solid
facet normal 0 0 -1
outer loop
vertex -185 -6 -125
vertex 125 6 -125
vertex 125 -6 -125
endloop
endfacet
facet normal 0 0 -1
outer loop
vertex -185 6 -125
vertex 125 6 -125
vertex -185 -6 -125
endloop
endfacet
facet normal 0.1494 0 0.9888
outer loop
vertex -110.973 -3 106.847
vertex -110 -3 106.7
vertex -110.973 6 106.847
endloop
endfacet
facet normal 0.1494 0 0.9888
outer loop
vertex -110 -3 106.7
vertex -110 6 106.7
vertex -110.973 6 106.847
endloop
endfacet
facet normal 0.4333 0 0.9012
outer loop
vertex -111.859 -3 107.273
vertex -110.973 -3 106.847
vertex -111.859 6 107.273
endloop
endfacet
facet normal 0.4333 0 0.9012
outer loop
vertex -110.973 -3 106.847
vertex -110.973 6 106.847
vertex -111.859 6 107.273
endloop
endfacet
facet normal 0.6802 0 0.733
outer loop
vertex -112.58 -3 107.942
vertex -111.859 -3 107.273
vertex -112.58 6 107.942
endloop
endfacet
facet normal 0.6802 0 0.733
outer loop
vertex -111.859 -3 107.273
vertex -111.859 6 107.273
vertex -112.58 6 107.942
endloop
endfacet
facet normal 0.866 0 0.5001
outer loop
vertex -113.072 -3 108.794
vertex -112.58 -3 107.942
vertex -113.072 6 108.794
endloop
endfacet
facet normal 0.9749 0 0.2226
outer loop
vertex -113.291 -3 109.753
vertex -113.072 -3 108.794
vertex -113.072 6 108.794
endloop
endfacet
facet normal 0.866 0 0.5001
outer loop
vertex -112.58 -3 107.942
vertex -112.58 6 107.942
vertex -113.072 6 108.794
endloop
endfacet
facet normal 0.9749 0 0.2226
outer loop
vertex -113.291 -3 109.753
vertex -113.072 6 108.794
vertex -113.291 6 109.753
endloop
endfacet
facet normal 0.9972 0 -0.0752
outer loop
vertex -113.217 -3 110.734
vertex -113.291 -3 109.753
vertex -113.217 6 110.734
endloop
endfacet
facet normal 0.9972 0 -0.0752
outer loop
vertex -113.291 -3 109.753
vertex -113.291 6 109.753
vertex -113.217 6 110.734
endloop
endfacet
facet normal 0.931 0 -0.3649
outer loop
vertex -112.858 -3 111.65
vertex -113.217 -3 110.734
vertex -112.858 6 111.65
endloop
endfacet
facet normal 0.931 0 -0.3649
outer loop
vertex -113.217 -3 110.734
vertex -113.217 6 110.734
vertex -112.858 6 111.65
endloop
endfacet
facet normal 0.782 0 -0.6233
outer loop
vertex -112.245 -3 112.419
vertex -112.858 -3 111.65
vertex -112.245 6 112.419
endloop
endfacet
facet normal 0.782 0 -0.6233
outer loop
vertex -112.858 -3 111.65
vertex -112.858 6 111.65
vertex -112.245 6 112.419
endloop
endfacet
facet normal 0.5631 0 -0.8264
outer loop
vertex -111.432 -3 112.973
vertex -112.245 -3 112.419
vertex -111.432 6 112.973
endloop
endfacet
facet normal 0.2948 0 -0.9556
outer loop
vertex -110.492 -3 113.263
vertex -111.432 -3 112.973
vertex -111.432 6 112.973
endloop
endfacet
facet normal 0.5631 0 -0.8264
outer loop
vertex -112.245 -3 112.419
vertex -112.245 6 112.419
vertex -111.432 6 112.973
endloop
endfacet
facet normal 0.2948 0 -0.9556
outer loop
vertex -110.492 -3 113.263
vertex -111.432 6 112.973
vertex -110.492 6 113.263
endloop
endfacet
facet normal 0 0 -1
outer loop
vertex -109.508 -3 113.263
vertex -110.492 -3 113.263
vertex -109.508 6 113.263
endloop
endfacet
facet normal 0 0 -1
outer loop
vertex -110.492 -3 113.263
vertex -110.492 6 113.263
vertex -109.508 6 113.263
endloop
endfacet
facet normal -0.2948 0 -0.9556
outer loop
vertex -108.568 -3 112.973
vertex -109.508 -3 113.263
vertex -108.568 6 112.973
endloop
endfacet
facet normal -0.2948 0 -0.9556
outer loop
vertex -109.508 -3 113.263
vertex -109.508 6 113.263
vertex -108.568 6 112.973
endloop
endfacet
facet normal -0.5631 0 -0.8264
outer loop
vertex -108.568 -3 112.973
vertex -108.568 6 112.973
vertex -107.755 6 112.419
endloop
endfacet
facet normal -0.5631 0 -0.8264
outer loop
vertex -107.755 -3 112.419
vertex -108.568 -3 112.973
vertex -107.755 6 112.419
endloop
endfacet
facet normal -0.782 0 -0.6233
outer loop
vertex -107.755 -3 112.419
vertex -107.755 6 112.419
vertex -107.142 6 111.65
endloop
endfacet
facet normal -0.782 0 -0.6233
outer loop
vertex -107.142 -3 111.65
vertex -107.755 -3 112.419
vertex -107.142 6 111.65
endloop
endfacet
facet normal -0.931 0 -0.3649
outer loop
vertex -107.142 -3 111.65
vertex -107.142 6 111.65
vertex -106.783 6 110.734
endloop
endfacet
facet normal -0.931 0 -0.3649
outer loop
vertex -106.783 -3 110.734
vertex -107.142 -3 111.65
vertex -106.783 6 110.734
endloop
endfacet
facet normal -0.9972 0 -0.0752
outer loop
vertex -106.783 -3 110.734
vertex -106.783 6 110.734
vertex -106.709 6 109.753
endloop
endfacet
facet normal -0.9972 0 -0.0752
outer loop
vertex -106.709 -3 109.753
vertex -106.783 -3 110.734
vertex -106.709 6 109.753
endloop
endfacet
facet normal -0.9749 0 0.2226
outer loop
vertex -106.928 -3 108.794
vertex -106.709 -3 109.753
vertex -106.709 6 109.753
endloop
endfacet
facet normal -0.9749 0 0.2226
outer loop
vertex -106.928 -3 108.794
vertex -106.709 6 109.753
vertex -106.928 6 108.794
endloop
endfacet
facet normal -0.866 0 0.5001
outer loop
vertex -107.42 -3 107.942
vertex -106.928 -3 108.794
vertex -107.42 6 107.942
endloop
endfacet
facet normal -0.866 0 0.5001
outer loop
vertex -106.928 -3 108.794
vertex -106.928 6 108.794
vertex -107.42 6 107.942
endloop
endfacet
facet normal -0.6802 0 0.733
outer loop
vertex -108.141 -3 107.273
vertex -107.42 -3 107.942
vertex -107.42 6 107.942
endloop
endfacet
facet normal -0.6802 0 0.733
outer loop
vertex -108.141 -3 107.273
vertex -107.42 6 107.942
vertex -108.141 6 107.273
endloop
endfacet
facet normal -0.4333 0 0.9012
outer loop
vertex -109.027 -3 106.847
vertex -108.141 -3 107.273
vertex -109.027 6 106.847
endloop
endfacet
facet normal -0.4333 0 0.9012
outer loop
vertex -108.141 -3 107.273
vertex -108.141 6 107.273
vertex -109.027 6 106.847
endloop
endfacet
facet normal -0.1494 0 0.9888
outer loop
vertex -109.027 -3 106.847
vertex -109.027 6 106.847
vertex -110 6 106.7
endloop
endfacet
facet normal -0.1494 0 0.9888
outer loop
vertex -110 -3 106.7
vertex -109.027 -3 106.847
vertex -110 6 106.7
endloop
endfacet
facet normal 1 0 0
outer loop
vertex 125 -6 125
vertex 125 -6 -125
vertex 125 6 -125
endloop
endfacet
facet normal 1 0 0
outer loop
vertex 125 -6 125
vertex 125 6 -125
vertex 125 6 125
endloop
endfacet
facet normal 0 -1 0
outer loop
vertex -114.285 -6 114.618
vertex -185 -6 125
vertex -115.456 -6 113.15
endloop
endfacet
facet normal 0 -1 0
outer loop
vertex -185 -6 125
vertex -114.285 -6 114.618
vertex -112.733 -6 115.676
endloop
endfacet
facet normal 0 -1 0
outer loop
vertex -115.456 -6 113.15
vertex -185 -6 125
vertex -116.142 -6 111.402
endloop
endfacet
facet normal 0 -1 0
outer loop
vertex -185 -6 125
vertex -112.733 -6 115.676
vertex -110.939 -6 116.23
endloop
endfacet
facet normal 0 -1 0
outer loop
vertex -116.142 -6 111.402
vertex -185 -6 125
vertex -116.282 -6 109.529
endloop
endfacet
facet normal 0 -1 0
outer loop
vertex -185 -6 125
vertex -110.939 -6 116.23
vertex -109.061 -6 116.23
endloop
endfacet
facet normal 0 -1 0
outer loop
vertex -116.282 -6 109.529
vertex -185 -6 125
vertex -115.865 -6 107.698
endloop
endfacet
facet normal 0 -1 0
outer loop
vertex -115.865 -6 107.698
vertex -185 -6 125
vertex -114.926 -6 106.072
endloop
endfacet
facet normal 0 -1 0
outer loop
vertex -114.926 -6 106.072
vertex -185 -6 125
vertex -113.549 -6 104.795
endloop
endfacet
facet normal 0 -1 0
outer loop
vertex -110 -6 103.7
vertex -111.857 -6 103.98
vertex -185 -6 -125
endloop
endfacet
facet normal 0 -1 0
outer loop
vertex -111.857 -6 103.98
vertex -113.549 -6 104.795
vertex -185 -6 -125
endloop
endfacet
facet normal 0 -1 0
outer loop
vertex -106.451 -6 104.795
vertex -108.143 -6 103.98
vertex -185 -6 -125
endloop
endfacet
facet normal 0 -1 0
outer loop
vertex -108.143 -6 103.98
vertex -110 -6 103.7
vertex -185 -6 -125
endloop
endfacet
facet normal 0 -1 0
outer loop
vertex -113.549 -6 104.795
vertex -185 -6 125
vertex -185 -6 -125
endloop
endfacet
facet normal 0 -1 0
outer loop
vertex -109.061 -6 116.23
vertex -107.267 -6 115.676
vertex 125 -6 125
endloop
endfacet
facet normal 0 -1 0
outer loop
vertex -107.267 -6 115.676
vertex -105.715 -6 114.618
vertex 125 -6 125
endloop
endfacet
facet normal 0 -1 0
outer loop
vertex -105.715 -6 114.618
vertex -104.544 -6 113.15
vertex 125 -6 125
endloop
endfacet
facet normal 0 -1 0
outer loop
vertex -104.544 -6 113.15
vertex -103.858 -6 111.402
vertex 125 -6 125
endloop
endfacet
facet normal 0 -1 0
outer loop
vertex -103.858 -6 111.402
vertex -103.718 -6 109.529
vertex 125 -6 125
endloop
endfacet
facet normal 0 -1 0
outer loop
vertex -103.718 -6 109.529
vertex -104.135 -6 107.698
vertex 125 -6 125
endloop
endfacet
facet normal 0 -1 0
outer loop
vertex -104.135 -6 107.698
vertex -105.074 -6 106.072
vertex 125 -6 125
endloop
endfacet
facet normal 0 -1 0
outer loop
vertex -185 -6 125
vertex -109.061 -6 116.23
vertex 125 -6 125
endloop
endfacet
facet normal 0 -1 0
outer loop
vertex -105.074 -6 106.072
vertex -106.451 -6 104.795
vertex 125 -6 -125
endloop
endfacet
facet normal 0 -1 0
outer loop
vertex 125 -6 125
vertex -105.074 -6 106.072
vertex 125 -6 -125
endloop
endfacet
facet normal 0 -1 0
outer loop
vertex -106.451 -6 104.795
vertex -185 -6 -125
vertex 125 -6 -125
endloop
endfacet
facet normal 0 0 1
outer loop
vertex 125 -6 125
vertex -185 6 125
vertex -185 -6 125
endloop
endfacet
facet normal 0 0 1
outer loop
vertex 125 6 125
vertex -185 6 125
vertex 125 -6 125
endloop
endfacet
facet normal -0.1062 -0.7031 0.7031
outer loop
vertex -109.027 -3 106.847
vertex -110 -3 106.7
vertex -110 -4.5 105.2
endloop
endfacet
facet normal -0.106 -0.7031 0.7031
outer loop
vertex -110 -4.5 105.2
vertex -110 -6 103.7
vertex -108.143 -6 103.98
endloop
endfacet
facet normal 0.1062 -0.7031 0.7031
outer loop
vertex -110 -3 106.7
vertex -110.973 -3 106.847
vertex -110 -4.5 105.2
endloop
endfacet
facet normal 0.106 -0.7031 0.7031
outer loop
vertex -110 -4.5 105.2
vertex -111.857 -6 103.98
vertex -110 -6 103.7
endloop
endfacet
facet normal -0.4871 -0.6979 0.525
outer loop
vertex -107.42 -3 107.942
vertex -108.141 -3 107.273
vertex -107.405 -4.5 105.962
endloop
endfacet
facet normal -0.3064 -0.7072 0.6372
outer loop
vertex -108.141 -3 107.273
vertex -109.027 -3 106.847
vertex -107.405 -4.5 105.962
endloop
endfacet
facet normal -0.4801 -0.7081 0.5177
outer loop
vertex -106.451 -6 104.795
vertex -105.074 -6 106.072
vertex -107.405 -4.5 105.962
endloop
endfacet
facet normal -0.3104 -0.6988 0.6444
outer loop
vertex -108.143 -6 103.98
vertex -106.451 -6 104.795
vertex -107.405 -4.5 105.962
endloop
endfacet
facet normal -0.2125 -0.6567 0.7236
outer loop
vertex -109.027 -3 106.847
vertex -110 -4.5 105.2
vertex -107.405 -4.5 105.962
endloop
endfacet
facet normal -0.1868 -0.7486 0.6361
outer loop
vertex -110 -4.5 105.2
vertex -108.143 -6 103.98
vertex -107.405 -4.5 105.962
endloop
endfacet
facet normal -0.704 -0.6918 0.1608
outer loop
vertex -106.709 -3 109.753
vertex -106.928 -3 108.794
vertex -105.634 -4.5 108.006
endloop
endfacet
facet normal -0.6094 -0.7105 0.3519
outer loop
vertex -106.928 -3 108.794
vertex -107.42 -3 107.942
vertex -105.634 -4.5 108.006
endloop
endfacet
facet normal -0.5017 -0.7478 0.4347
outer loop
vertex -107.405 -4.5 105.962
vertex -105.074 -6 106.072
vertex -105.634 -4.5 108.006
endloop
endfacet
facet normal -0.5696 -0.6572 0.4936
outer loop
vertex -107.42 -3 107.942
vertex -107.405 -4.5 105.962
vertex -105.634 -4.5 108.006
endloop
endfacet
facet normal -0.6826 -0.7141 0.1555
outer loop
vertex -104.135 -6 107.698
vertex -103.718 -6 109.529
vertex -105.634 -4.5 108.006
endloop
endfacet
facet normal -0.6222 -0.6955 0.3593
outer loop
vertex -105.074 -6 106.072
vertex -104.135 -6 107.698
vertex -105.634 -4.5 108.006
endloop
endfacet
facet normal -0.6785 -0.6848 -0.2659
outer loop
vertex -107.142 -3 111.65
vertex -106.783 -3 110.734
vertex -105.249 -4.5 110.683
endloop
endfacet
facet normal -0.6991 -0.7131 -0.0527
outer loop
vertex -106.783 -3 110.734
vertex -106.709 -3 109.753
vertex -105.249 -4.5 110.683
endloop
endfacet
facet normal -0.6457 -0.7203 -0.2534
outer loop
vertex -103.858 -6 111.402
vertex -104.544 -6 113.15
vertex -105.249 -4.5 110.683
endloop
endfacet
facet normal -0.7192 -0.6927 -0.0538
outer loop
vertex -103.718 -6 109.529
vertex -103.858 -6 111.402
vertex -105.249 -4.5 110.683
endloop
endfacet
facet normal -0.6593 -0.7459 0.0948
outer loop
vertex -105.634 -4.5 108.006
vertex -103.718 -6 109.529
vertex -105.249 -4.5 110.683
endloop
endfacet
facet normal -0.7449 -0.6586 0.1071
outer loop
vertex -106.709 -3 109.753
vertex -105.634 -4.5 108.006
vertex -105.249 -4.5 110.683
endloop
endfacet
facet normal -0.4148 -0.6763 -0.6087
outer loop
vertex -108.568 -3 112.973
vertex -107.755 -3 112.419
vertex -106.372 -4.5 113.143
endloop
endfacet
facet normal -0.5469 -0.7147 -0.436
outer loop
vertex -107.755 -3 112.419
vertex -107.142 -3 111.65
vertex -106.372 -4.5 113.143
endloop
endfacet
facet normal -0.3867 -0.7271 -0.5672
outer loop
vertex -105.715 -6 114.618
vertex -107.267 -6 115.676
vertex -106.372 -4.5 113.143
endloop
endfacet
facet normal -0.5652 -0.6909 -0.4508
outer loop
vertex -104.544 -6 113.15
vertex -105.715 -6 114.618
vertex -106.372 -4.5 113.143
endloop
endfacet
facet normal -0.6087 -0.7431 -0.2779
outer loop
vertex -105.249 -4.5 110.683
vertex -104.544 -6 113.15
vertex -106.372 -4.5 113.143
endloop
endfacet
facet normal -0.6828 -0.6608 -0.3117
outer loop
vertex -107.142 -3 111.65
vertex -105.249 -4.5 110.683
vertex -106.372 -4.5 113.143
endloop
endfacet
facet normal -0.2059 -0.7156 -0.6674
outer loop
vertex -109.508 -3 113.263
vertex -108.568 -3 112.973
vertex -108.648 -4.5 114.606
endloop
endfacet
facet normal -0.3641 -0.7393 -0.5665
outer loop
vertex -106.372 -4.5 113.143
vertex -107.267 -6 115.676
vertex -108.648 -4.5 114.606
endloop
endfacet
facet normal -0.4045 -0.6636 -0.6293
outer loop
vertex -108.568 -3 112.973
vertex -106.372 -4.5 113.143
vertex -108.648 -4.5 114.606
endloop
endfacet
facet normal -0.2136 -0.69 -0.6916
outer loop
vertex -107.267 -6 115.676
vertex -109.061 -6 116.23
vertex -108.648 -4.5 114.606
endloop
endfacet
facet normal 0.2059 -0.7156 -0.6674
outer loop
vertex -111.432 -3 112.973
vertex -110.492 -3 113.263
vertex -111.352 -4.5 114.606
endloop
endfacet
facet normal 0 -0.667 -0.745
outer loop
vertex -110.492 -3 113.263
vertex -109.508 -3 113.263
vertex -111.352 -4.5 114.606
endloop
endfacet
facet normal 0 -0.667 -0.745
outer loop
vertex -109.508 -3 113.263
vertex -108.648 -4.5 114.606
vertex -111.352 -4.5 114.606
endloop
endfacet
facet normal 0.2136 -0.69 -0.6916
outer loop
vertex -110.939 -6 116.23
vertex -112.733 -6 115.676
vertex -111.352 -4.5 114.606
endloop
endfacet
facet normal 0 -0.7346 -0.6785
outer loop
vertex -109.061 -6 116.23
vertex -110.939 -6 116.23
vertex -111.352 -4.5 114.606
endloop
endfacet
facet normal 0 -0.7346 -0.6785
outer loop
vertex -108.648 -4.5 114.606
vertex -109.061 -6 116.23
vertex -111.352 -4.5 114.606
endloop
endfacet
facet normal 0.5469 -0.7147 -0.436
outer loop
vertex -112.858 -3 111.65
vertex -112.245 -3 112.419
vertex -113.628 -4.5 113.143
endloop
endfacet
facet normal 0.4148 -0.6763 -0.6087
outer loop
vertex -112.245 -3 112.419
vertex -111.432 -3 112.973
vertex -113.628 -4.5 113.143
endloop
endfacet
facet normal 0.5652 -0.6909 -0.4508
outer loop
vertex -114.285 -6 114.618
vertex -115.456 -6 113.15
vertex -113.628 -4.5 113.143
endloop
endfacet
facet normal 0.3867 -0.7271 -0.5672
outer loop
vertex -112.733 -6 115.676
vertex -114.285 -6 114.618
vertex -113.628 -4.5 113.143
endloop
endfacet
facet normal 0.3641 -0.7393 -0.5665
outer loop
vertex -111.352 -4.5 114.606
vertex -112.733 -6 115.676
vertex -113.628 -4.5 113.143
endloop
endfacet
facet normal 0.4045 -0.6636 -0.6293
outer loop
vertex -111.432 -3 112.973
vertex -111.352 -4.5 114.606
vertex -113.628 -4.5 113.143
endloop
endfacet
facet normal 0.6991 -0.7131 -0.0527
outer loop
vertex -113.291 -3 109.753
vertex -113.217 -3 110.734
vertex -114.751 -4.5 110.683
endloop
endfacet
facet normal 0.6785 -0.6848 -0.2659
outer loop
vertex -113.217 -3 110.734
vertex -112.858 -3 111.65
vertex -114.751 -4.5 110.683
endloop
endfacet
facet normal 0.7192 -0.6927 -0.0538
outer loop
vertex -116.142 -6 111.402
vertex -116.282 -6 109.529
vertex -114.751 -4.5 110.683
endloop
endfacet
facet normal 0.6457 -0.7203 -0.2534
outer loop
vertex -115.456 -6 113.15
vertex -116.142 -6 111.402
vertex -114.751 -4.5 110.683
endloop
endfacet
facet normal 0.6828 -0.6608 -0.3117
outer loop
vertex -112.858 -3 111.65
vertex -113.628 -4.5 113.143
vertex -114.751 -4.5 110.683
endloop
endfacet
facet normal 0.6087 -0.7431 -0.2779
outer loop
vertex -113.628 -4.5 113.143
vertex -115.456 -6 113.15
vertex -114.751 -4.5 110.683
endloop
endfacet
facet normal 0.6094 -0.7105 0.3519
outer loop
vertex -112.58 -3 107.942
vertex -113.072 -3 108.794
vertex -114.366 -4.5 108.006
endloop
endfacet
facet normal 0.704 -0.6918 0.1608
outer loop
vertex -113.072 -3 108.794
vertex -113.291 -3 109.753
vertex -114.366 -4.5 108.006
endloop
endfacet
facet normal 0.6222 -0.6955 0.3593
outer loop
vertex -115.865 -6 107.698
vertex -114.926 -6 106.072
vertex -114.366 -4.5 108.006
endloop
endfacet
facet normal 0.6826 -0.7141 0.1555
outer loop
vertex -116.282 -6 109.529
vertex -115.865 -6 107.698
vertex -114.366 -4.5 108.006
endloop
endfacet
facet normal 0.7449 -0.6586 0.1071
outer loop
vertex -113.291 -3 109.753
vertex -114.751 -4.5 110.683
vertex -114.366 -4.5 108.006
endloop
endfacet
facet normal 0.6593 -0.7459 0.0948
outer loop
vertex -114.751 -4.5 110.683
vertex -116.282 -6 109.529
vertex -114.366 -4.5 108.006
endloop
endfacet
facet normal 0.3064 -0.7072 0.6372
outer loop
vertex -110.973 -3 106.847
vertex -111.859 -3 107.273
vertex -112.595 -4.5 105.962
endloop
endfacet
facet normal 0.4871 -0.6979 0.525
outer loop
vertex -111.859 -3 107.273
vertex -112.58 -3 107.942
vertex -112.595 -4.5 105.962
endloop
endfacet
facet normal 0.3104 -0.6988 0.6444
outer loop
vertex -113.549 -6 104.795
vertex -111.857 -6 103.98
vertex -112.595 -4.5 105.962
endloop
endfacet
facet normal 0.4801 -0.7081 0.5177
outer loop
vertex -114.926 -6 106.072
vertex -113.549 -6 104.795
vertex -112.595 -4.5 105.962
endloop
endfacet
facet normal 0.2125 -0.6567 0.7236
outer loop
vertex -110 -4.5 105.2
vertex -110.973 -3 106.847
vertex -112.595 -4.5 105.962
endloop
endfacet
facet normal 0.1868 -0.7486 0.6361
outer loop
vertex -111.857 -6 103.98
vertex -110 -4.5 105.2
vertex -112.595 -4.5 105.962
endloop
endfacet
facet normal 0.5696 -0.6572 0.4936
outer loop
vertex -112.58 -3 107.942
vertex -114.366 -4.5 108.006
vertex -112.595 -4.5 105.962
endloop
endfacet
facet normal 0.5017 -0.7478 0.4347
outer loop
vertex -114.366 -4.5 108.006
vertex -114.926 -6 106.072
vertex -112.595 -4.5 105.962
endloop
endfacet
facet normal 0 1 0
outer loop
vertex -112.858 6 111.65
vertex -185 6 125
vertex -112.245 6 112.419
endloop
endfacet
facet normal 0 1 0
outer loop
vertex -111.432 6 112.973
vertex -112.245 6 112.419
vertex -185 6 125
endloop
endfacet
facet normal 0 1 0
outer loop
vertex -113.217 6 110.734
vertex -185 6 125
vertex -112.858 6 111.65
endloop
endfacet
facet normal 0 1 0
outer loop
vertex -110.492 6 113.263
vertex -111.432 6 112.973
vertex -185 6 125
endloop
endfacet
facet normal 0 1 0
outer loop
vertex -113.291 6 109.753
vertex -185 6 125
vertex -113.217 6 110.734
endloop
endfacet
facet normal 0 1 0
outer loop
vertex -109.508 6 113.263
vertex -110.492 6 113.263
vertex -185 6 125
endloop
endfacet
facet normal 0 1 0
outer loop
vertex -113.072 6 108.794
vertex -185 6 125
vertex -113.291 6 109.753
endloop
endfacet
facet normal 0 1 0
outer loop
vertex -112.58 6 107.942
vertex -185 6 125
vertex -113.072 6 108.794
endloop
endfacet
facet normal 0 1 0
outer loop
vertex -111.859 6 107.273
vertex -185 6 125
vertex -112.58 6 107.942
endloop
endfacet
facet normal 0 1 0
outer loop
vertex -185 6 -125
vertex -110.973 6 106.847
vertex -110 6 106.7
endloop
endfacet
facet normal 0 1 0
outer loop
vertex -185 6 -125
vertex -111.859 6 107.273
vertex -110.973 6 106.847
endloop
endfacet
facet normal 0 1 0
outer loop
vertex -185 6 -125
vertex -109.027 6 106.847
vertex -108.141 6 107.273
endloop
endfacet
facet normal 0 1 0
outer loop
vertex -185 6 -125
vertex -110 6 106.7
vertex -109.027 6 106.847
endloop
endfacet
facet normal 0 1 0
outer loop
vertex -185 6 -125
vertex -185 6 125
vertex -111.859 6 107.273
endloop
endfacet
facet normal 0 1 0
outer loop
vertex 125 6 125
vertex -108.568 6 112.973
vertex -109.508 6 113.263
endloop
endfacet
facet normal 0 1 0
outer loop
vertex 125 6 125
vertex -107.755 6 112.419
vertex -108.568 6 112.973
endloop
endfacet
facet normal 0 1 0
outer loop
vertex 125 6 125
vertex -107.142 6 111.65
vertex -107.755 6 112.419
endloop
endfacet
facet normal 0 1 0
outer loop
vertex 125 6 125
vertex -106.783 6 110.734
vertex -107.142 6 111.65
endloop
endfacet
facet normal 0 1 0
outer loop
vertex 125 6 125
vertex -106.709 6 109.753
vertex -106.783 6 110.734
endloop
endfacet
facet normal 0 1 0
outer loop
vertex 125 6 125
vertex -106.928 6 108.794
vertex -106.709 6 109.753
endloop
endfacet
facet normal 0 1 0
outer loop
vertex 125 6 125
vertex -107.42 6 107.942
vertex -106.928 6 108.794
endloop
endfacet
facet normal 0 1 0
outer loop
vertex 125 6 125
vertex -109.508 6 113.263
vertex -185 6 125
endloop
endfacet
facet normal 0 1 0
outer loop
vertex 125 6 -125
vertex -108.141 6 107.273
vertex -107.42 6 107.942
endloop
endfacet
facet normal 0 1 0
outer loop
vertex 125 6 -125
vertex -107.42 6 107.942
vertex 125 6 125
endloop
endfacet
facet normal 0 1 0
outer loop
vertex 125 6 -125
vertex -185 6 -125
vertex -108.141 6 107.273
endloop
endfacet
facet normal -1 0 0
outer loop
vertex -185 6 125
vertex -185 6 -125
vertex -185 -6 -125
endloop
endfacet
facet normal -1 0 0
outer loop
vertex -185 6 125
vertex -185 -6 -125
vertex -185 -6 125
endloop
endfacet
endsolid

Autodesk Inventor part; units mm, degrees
ref_plane "YZ Plane" through (0, 0, 0) normal (1, 0, 0) x (0, 1, 0)
ref_plane "XZ Plane" through (0, 0, 0) normal (0, 1, 0) x (-1, 0, 0)
ref_plane "XY Plane" through (0, 0, 0) normal (0, 0, 1) x (1, 0, 0)
sketch "스케치1" plane through (0, 0, 0) normal (0, 1, 0) x (-1, 0, 0)
  line L0 (125, -125) -> (-125, -125)
  line L1 (-125, -125) -> (-125, 125)
  line L2 (-125, 125) -> (125, 125)
  line L3 (125, 125) -> (125, -125)
  point P0 (0, 0)
  point P1 (125, 0)
  point P2 (0, -125)
  dimension "d0" = 250
  dimension "d1" = 250
extrude "돌출1" add sketch "스케치1" along normal mid plane 12
sketch "Sketch2" plane through (0, 6, 0) normal (0, 1, 0) x (1, 0, 0)
  line L0 (-125, -125) -> (-95, -125)
  line L1 (-95, -125) -> (-95, -95)
  line L2 (-95, -95) -> (-125, -95)
  line L3 (-125, -95) -> (-125, -125)
  line L4 (-125, -95) -> (-95, -125)
  line L5 (-95, -95) -> (-125, -125)
  point P0 (0, 0)
  point P1 (-110, -110)
  point P2 (-95, -110)
  point P3 (-110, -95)
  dimension "d5" = 30
  dimension "d6" = 30
sketch "Sketch3" plane through (0, 6, 0) normal (0, 1, 0) x (1, 0, 0)
  line L0 (-125, -125) -> (-125, 125) projected
  line L1 (-125, 125) -> (-185, 125)
  line L2 (-185, 125) -> (-185, -125)
  line L3 (-185, -125) -> (-125, -125)
  line L4 (-125, -125) -> (-125, 125)
  point P0 (0, 0)
  dimension "d7" = 60
  dimension "d8" = 250
extrude "Extrusion2" add sketch "Sketch3" against normal up to surface (12 mm away)
sketch "Sketch4" plane through (0, -6, 0) normal (0, -1, 0) x (1, 0, 0)
  circle A0 centre (-110, 110) radius 2.5 projected
  point P0 (0, 0)
hole "Hole1" at (-110, -6, 110) direction (0, 1, 0) diameter 6.6 end through all countersink diameter 12.6 countersink angle 90 clearance for "Countersunk Flat Head Screw ISO 2009/7046" size "M6" standard "ISO"
equation "\"d1\" = d0"
equation "\"TransitionRadius\" = BendRadius"
equation "\"BendRadius\" = 0.5"
properties part number "Base_Wood_Plate" material "Wood (Birch)"
